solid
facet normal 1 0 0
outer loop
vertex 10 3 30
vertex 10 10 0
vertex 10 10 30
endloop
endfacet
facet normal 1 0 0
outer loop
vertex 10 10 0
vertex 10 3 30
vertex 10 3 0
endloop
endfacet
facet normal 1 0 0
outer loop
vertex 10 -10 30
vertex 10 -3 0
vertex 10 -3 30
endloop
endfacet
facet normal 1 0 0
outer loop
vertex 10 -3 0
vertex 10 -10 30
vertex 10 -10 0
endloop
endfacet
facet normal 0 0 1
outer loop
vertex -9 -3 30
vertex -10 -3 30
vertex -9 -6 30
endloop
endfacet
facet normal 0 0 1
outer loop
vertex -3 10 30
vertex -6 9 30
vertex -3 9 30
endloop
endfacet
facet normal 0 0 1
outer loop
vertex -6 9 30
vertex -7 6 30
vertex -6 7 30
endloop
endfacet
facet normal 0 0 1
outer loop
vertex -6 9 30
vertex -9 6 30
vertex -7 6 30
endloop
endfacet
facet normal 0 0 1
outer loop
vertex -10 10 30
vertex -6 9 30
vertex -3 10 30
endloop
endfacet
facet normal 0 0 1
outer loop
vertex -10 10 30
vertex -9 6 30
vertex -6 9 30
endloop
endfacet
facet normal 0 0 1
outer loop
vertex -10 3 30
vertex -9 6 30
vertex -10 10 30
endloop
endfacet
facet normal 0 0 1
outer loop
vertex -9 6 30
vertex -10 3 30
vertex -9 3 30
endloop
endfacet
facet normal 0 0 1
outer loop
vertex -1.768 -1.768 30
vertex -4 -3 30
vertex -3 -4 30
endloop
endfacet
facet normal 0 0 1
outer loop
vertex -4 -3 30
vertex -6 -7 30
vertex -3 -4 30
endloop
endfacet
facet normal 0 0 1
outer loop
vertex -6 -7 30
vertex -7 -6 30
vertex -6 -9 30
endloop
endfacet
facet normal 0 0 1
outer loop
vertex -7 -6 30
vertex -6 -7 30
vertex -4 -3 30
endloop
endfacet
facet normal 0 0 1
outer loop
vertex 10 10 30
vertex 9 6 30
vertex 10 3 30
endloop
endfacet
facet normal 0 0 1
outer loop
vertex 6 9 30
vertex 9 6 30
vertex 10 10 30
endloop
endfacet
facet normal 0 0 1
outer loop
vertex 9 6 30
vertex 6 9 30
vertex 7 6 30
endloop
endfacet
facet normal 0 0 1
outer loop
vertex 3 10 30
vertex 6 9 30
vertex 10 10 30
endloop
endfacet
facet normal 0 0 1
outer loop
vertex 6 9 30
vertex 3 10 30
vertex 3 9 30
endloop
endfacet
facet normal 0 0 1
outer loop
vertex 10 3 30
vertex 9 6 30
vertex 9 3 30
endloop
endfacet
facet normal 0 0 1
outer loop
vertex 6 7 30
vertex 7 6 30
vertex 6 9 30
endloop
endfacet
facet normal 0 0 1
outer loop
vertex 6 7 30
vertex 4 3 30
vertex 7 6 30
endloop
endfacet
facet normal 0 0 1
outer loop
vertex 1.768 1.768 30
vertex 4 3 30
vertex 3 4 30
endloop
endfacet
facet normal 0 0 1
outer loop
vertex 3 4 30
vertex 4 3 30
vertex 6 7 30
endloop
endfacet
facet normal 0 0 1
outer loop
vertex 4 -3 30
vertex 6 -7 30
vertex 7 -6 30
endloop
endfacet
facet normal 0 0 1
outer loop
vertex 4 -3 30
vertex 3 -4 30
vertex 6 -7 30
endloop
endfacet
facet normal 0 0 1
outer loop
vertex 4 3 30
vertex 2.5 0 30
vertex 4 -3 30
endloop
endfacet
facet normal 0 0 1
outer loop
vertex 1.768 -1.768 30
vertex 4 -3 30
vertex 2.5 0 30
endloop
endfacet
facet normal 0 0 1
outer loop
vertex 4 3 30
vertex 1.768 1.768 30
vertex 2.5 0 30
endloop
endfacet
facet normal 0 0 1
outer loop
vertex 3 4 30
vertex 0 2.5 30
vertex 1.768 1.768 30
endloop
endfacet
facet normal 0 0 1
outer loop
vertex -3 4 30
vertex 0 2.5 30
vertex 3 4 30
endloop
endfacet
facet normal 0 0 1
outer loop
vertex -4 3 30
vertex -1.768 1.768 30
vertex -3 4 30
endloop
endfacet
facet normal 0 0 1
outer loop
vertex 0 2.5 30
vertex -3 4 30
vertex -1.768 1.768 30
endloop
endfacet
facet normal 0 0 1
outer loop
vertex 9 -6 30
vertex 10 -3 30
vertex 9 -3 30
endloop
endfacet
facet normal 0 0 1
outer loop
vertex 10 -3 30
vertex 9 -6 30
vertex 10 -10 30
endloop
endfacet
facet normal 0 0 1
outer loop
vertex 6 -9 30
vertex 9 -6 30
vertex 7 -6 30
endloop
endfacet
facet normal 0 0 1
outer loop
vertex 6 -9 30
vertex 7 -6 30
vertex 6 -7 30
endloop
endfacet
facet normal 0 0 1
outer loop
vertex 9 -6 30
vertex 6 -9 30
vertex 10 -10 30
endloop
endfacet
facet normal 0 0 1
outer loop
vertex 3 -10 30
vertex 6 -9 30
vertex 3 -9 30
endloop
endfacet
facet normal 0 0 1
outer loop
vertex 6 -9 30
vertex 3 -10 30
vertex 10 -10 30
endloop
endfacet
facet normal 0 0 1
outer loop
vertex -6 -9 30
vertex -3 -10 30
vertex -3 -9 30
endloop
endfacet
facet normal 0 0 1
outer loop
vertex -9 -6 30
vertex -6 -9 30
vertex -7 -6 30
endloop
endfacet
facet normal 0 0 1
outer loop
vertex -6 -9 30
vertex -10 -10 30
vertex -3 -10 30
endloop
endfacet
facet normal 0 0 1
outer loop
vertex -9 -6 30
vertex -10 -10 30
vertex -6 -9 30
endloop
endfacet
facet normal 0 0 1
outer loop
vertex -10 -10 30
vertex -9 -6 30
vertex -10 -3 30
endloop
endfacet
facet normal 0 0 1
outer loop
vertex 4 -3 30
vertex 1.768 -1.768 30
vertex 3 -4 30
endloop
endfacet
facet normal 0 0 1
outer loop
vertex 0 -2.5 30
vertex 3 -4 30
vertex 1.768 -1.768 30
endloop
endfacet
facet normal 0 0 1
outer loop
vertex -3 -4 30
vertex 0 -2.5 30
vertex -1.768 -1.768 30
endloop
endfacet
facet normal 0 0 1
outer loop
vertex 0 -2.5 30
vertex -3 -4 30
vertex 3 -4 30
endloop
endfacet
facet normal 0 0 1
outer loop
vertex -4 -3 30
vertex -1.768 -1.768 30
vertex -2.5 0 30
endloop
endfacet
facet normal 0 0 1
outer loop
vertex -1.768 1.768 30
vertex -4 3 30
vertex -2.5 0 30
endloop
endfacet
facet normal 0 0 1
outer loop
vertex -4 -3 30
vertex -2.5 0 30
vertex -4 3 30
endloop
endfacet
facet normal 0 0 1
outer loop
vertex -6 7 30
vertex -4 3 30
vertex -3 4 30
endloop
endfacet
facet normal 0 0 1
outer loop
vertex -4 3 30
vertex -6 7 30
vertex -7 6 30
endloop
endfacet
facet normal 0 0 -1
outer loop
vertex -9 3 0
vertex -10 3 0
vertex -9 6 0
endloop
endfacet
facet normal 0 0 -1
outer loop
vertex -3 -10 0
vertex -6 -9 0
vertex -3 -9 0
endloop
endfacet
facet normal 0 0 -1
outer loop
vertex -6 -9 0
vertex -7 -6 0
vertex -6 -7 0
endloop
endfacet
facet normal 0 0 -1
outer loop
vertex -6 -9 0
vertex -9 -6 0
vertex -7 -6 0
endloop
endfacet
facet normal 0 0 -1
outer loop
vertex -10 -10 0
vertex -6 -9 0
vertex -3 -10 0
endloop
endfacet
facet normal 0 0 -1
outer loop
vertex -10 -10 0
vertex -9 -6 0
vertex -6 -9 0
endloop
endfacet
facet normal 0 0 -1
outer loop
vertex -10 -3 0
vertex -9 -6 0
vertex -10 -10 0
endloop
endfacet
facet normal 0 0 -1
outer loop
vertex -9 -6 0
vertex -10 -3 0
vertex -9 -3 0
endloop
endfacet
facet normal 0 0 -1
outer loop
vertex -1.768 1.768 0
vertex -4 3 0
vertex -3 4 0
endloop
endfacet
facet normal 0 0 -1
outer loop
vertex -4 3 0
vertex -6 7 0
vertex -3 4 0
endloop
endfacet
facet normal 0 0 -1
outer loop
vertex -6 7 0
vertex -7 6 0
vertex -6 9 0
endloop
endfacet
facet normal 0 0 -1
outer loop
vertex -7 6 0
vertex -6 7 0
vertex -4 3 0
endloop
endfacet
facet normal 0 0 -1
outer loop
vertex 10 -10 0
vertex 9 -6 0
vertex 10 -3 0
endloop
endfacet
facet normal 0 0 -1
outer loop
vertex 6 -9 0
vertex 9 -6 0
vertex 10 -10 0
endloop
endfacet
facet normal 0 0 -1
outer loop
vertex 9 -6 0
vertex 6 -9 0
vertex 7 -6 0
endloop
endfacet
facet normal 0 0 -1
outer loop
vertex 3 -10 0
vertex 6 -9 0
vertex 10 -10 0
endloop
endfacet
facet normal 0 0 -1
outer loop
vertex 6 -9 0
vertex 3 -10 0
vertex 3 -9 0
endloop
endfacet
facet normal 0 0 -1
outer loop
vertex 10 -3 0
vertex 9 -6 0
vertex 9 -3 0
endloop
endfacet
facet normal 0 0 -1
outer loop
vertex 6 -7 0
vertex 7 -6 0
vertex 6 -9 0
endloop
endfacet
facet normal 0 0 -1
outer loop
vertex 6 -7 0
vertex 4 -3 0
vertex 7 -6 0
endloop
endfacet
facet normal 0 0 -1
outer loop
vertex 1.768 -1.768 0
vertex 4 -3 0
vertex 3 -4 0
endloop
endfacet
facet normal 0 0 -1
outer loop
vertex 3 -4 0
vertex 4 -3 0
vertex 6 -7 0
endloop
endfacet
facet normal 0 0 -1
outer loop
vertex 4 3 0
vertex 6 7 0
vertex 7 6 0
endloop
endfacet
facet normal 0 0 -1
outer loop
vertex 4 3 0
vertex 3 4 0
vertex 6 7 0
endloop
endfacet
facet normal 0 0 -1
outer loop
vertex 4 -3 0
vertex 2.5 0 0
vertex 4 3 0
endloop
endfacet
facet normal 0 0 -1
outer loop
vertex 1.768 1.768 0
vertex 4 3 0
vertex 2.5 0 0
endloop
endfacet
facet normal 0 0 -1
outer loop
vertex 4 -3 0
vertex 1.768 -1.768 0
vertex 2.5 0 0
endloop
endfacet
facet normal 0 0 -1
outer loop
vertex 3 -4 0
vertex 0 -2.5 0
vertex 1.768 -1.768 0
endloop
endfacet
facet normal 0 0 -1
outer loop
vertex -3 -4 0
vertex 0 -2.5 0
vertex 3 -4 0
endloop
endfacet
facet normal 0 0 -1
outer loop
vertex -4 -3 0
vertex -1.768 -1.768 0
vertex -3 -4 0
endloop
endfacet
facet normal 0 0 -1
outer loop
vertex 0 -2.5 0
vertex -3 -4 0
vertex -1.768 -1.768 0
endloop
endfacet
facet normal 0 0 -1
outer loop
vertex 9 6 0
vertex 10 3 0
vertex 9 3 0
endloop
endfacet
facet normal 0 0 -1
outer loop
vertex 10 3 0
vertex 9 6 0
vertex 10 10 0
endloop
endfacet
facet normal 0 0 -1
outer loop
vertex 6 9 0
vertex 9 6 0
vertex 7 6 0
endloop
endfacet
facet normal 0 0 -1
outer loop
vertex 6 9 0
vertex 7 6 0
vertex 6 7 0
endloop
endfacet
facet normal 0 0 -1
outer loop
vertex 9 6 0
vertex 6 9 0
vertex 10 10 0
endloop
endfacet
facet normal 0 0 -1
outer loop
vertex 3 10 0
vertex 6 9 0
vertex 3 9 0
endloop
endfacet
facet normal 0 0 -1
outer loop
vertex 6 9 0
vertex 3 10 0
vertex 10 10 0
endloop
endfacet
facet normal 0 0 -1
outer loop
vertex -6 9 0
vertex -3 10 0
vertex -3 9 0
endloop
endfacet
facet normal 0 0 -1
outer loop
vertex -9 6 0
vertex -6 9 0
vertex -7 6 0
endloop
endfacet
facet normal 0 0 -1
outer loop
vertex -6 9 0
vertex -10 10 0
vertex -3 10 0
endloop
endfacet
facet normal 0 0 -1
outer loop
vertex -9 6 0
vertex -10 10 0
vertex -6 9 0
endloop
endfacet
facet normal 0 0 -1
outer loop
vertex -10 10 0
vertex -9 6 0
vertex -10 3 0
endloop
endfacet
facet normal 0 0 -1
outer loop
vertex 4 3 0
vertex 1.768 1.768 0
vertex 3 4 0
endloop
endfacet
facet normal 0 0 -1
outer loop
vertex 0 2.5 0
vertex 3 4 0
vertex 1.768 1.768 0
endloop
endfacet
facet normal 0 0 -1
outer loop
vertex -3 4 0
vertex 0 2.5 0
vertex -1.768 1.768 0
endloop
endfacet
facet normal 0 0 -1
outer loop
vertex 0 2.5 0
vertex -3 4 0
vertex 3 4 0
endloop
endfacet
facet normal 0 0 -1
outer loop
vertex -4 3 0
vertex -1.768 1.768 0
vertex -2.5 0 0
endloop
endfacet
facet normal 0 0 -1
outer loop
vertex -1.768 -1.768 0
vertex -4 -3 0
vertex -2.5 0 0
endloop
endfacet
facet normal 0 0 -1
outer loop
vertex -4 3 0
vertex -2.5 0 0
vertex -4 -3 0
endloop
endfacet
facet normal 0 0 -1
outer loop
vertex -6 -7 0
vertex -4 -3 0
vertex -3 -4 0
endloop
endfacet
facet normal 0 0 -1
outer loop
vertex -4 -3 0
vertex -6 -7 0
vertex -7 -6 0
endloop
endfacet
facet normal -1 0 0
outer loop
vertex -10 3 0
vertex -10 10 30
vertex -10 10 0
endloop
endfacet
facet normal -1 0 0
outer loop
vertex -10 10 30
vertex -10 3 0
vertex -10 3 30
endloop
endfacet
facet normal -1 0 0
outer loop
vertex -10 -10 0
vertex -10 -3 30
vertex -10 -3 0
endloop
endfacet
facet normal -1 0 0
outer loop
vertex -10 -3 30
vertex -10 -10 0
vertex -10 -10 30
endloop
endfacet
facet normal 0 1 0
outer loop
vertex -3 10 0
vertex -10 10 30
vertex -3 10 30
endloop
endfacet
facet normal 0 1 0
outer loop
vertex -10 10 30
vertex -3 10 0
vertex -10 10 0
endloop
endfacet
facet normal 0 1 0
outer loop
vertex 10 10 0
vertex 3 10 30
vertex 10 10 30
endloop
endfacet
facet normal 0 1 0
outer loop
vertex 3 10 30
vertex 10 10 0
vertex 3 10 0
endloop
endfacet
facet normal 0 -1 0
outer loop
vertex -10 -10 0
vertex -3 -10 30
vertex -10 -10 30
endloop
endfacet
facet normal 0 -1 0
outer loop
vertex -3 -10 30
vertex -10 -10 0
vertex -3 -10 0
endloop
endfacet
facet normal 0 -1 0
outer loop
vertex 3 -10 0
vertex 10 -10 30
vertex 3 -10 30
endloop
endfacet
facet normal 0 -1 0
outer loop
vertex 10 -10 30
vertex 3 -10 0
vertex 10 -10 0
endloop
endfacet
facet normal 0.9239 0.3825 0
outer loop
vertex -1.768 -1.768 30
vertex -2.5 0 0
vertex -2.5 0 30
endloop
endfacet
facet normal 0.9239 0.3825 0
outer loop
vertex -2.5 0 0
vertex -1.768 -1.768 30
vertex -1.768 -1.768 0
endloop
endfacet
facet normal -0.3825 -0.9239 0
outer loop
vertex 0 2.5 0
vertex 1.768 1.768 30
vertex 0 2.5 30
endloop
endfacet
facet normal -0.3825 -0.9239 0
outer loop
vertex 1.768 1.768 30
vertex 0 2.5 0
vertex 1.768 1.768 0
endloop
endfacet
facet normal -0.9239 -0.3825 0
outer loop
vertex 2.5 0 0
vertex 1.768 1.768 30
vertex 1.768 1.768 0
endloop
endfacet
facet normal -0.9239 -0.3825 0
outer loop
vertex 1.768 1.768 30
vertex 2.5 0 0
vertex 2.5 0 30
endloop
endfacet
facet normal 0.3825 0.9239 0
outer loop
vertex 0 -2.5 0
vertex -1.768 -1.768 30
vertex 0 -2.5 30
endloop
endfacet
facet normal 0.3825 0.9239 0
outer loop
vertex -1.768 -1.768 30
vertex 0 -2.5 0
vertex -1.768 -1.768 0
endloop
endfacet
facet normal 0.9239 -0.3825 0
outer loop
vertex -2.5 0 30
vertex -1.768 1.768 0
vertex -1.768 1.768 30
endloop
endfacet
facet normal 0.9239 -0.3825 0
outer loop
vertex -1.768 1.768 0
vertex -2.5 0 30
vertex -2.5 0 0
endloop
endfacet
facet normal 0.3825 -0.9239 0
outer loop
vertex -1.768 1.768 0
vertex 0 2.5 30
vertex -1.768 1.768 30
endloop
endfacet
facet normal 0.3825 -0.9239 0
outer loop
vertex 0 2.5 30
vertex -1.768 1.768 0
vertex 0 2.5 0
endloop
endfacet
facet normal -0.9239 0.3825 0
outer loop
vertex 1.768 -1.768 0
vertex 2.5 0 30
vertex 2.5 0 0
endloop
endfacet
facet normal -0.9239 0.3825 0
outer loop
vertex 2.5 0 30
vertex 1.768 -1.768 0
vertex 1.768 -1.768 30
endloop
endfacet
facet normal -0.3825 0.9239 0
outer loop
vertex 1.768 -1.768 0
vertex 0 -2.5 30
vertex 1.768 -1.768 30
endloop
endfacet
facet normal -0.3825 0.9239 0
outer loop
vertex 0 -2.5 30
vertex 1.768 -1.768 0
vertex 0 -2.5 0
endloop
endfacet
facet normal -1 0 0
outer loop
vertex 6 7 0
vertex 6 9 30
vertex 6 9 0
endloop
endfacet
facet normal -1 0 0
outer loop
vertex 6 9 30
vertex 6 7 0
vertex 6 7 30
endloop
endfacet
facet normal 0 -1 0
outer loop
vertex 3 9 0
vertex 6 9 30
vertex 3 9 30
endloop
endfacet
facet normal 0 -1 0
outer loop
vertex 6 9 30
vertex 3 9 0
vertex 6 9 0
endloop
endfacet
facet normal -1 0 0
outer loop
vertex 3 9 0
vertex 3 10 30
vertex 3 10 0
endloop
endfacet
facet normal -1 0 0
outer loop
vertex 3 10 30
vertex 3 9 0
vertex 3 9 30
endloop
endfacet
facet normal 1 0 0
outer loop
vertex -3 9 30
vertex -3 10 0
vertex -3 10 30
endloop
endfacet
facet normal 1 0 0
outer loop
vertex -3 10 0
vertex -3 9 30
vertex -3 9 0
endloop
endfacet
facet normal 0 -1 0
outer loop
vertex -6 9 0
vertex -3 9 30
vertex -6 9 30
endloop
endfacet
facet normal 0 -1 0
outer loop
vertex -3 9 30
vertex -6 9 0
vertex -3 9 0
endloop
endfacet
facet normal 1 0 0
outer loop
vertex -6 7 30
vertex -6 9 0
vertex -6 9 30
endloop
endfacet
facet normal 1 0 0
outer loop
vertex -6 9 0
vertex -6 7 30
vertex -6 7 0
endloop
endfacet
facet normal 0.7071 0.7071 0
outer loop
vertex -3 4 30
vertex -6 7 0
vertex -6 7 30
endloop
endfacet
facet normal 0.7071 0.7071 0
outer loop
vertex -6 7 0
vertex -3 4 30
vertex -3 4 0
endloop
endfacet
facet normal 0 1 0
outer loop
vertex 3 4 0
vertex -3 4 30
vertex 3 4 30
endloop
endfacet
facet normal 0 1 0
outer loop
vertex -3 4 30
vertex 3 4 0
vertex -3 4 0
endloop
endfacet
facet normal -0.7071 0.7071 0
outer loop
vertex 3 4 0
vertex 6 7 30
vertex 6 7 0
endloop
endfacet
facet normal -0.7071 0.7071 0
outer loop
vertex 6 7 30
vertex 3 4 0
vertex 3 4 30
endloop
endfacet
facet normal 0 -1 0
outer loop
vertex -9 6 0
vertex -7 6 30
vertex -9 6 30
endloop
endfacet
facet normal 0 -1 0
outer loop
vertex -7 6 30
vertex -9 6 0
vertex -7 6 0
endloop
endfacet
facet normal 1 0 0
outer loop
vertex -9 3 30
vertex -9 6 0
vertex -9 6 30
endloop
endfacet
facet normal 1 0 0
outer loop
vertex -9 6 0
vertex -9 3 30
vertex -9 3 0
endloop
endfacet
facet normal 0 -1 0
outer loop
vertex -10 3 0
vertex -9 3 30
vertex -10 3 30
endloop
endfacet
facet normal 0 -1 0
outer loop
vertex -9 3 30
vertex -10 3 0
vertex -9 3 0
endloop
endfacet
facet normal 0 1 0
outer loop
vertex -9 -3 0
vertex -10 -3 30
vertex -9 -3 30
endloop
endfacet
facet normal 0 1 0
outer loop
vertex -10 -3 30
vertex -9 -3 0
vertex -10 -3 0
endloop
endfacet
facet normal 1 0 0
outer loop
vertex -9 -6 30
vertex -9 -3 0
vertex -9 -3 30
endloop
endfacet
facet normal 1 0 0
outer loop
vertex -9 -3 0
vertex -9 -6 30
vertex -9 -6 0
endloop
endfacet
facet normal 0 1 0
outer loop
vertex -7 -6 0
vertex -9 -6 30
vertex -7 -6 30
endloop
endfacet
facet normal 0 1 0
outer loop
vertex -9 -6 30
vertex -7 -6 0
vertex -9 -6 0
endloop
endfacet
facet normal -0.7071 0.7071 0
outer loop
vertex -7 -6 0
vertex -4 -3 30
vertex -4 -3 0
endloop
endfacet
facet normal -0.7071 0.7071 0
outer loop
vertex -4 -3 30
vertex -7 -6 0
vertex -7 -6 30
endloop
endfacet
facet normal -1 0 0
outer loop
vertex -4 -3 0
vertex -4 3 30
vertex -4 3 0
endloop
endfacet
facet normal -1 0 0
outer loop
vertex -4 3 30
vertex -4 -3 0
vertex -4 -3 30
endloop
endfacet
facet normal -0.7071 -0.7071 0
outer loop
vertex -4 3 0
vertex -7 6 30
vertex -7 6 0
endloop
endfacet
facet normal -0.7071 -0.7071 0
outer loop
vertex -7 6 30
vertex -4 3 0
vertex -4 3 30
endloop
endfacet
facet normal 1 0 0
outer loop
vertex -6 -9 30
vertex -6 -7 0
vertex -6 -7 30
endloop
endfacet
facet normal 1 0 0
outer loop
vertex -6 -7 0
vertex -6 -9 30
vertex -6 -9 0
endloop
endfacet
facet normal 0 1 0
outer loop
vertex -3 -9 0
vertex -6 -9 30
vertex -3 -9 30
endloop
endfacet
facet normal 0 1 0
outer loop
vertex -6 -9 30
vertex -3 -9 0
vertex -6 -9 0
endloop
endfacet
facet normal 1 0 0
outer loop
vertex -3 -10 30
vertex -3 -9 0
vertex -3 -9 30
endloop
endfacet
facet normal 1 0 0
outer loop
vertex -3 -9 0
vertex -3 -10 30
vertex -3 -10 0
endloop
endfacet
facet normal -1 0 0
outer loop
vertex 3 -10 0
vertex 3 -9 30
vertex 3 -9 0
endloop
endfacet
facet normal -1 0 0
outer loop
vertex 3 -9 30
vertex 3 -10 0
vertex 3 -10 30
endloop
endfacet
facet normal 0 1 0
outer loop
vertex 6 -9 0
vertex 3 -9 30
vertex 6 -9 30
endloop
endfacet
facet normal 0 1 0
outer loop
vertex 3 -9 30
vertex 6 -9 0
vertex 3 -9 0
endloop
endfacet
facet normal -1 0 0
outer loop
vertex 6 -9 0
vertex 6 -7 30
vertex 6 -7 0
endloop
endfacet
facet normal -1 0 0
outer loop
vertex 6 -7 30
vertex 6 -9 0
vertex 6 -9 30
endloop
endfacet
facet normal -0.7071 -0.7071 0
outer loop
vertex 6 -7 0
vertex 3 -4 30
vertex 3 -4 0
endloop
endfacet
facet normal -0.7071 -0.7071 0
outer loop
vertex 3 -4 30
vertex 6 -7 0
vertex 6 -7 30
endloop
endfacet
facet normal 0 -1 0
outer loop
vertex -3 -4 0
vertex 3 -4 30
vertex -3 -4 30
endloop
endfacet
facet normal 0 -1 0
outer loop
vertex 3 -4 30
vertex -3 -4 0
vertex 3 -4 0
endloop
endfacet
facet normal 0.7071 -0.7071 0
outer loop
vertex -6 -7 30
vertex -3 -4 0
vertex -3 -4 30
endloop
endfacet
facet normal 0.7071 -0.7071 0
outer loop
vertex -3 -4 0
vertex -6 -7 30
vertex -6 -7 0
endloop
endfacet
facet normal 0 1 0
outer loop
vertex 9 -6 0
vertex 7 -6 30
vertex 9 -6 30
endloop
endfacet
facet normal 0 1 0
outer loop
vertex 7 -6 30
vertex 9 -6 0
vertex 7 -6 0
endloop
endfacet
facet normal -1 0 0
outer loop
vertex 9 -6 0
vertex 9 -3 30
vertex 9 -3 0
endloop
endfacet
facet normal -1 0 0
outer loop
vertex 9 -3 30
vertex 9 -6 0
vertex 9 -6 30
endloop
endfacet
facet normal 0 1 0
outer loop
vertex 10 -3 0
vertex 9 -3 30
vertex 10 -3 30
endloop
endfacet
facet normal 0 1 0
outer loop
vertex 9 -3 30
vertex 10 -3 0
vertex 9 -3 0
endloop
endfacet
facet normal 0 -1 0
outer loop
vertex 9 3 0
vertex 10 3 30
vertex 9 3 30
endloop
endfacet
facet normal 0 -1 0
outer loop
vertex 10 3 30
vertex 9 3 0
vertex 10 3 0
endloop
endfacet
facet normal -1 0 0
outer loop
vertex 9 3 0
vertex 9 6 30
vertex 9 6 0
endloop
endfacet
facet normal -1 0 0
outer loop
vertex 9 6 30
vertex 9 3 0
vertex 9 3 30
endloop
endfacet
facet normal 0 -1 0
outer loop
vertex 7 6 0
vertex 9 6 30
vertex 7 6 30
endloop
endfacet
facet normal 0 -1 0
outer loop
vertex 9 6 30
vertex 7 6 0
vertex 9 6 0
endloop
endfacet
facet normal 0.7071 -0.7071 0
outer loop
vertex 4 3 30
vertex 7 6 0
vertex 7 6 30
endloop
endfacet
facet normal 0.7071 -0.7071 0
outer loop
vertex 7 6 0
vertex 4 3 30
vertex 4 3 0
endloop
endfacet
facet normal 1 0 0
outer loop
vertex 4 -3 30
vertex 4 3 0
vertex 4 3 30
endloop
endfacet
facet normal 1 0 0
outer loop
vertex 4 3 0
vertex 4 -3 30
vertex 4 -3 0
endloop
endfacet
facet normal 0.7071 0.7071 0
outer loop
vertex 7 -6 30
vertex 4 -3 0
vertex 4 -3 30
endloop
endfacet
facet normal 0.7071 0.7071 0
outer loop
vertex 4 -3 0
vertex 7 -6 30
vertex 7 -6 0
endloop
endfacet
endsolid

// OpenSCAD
//height = 10;

module al_extrusion(height,x,y,z){
    translate([x,y,z])render()difference(){
            
        translate([0,0,height/2])cube([20,20,height], center = true);
        
        color("blue")cylinder(h = height, r = 5/2);
        
        color("blue")rotate(a=0,v=[0,0,1])linear_extrude(height = height)polygon(points = [[3,4],[6,7],[6,9],[3,9],[3,10],[-3,10],[-3,9],[-6,9],[-6,7],[-3,4]]);
        
         color("blue")rotate(a=90,v=[0,0,1])linear_extrude(height = height)polygon(points = [[3,4],[6,7],[6,9],[3,9],[3,10],[-3,10],[-3,9],[-6,9],[-6,7],[-3,4]]);
        
         color("blue")rotate(a=180,v=[0,0,1])linear_extrude(height = height)polygon(points = [[3,4],[6,7],[6,9],[3,9],[3,10],[-3,10],[-3,9],[-6,9],[-6,7],[-3,4]]);
        
         color("blue")rotate(a=270,v=[0,0,1])linear_extrude(height = height)polygon(points = [[3,4],[6,7],[6,9],[3,9],[3,10],[-3,10],[-3,9],[-6,9],[-6,7],[-3,4]]);
        
      
    
        
    }
}

al_extrusion(30,0,0,0);
